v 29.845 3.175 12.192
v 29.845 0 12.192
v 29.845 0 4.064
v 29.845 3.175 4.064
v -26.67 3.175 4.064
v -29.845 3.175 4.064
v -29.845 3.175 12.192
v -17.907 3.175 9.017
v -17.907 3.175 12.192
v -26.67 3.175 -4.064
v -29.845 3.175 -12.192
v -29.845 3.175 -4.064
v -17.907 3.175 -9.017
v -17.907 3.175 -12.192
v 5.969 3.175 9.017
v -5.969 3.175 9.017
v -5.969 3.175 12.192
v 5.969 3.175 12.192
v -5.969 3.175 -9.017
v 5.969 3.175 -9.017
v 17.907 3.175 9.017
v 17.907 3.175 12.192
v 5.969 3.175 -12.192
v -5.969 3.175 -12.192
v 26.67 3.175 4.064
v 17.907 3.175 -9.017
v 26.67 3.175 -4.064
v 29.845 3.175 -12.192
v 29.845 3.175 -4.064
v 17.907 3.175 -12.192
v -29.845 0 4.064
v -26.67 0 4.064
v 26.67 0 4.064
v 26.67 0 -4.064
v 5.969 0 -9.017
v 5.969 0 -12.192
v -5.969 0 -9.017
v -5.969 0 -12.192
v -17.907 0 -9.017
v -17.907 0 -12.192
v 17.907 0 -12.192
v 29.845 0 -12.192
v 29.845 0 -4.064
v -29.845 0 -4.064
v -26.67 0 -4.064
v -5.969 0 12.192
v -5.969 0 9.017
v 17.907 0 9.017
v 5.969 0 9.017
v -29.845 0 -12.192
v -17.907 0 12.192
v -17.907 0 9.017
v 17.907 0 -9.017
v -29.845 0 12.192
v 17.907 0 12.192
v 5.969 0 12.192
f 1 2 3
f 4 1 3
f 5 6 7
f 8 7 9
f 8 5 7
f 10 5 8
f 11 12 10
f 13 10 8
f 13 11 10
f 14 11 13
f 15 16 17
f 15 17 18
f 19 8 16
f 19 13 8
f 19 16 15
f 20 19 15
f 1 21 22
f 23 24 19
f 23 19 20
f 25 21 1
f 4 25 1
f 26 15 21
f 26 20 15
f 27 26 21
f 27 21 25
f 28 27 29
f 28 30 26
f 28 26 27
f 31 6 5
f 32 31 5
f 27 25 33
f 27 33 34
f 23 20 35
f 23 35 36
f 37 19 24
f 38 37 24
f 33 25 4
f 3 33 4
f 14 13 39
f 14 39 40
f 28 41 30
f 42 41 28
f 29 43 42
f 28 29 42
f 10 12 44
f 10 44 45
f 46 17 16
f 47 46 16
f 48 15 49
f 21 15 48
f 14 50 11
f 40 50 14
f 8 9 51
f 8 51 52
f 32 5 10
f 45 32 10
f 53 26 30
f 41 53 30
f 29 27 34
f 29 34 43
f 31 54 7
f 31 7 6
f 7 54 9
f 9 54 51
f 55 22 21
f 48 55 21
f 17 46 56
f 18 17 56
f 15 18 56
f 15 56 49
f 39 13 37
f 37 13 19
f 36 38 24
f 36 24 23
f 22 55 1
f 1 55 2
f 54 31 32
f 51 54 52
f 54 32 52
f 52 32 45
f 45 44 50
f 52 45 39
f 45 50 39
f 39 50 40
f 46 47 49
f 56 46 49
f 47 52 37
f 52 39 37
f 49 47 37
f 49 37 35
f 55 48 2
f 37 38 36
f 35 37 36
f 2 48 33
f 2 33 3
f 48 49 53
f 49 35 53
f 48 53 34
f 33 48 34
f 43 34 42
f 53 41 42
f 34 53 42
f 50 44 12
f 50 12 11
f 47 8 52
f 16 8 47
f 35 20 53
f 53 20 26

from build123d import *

# Parameters (mm, degrees)
SKETCH1_W           = 59.69
SKETCH1_H           = 24.384
BOSS_EXTRUDE2_DEPTH = 3.175
SKETCH3_W           = 11.938
SKETCH3_H           = 3.175
CUT_EXTRUDE2_DEPTH  = 3.175
LPATTERN2_COUNT     = 2
LPATTERN2_PITCH     = 23.876
SKETCH4_W           = 6.35
SKETCH4_H           = 8.128
CUT_EXTRUDE3_DEPTH  = 3.175


with BuildPart() as part:
    # Sketch1 → Boss-Extrude2 (new body)
    with BuildSketch(Plane(origin=(0, 0, 0), x_dir=(1, 0, 0), z_dir=(0, 1, 0))):
        Rectangle(SKETCH1_W, SKETCH1_H)
    extrude(amount=BOSS_EXTRUDE2_DEPTH)

    # Sketch3 → Cut-Extrude2 (cut)
    with BuildSketch(Plane(origin=(0, 3.175, 0), x_dir=(1, 0, 0), z_dir=(0, 1, 0))):
        with Locations((11.938, 10.6045)):
            Rectangle(SKETCH3_W, SKETCH3_H)
        with Locations((11.938, -10.6045)):
            Rectangle(SKETCH3_W, SKETCH3_H)
    cut_extrude2 = extrude(amount=-CUT_EXTRUDE2_DEPTH, mode=Mode.SUBTRACT)

    # LPattern2: Cut-Extrude2 ×2
    with Locations(*[(-i * LPATTERN2_PITCH, 0, 0) for i in range(1, LPATTERN2_COUNT)]):
        add(cut_extrude2, mode=Mode.SUBTRACT)

    # Sketch4 → Cut-Extrude3 (cut)
    with BuildSketch(Plane(origin=(0, 3.175, 0), x_dir=(1, 0, 0), z_dir=(0, 1, 0))):
        with Locations((-29.845, 0)):
            Rectangle(SKETCH4_W, SKETCH4_H)
        with Locations((29.845, 0)):
            Rectangle(SKETCH4_W, SKETCH4_H)
    extrude(amount=-CUT_EXTRUDE3_DEPTH, mode=Mode.SUBTRACT)


solid = part.part
